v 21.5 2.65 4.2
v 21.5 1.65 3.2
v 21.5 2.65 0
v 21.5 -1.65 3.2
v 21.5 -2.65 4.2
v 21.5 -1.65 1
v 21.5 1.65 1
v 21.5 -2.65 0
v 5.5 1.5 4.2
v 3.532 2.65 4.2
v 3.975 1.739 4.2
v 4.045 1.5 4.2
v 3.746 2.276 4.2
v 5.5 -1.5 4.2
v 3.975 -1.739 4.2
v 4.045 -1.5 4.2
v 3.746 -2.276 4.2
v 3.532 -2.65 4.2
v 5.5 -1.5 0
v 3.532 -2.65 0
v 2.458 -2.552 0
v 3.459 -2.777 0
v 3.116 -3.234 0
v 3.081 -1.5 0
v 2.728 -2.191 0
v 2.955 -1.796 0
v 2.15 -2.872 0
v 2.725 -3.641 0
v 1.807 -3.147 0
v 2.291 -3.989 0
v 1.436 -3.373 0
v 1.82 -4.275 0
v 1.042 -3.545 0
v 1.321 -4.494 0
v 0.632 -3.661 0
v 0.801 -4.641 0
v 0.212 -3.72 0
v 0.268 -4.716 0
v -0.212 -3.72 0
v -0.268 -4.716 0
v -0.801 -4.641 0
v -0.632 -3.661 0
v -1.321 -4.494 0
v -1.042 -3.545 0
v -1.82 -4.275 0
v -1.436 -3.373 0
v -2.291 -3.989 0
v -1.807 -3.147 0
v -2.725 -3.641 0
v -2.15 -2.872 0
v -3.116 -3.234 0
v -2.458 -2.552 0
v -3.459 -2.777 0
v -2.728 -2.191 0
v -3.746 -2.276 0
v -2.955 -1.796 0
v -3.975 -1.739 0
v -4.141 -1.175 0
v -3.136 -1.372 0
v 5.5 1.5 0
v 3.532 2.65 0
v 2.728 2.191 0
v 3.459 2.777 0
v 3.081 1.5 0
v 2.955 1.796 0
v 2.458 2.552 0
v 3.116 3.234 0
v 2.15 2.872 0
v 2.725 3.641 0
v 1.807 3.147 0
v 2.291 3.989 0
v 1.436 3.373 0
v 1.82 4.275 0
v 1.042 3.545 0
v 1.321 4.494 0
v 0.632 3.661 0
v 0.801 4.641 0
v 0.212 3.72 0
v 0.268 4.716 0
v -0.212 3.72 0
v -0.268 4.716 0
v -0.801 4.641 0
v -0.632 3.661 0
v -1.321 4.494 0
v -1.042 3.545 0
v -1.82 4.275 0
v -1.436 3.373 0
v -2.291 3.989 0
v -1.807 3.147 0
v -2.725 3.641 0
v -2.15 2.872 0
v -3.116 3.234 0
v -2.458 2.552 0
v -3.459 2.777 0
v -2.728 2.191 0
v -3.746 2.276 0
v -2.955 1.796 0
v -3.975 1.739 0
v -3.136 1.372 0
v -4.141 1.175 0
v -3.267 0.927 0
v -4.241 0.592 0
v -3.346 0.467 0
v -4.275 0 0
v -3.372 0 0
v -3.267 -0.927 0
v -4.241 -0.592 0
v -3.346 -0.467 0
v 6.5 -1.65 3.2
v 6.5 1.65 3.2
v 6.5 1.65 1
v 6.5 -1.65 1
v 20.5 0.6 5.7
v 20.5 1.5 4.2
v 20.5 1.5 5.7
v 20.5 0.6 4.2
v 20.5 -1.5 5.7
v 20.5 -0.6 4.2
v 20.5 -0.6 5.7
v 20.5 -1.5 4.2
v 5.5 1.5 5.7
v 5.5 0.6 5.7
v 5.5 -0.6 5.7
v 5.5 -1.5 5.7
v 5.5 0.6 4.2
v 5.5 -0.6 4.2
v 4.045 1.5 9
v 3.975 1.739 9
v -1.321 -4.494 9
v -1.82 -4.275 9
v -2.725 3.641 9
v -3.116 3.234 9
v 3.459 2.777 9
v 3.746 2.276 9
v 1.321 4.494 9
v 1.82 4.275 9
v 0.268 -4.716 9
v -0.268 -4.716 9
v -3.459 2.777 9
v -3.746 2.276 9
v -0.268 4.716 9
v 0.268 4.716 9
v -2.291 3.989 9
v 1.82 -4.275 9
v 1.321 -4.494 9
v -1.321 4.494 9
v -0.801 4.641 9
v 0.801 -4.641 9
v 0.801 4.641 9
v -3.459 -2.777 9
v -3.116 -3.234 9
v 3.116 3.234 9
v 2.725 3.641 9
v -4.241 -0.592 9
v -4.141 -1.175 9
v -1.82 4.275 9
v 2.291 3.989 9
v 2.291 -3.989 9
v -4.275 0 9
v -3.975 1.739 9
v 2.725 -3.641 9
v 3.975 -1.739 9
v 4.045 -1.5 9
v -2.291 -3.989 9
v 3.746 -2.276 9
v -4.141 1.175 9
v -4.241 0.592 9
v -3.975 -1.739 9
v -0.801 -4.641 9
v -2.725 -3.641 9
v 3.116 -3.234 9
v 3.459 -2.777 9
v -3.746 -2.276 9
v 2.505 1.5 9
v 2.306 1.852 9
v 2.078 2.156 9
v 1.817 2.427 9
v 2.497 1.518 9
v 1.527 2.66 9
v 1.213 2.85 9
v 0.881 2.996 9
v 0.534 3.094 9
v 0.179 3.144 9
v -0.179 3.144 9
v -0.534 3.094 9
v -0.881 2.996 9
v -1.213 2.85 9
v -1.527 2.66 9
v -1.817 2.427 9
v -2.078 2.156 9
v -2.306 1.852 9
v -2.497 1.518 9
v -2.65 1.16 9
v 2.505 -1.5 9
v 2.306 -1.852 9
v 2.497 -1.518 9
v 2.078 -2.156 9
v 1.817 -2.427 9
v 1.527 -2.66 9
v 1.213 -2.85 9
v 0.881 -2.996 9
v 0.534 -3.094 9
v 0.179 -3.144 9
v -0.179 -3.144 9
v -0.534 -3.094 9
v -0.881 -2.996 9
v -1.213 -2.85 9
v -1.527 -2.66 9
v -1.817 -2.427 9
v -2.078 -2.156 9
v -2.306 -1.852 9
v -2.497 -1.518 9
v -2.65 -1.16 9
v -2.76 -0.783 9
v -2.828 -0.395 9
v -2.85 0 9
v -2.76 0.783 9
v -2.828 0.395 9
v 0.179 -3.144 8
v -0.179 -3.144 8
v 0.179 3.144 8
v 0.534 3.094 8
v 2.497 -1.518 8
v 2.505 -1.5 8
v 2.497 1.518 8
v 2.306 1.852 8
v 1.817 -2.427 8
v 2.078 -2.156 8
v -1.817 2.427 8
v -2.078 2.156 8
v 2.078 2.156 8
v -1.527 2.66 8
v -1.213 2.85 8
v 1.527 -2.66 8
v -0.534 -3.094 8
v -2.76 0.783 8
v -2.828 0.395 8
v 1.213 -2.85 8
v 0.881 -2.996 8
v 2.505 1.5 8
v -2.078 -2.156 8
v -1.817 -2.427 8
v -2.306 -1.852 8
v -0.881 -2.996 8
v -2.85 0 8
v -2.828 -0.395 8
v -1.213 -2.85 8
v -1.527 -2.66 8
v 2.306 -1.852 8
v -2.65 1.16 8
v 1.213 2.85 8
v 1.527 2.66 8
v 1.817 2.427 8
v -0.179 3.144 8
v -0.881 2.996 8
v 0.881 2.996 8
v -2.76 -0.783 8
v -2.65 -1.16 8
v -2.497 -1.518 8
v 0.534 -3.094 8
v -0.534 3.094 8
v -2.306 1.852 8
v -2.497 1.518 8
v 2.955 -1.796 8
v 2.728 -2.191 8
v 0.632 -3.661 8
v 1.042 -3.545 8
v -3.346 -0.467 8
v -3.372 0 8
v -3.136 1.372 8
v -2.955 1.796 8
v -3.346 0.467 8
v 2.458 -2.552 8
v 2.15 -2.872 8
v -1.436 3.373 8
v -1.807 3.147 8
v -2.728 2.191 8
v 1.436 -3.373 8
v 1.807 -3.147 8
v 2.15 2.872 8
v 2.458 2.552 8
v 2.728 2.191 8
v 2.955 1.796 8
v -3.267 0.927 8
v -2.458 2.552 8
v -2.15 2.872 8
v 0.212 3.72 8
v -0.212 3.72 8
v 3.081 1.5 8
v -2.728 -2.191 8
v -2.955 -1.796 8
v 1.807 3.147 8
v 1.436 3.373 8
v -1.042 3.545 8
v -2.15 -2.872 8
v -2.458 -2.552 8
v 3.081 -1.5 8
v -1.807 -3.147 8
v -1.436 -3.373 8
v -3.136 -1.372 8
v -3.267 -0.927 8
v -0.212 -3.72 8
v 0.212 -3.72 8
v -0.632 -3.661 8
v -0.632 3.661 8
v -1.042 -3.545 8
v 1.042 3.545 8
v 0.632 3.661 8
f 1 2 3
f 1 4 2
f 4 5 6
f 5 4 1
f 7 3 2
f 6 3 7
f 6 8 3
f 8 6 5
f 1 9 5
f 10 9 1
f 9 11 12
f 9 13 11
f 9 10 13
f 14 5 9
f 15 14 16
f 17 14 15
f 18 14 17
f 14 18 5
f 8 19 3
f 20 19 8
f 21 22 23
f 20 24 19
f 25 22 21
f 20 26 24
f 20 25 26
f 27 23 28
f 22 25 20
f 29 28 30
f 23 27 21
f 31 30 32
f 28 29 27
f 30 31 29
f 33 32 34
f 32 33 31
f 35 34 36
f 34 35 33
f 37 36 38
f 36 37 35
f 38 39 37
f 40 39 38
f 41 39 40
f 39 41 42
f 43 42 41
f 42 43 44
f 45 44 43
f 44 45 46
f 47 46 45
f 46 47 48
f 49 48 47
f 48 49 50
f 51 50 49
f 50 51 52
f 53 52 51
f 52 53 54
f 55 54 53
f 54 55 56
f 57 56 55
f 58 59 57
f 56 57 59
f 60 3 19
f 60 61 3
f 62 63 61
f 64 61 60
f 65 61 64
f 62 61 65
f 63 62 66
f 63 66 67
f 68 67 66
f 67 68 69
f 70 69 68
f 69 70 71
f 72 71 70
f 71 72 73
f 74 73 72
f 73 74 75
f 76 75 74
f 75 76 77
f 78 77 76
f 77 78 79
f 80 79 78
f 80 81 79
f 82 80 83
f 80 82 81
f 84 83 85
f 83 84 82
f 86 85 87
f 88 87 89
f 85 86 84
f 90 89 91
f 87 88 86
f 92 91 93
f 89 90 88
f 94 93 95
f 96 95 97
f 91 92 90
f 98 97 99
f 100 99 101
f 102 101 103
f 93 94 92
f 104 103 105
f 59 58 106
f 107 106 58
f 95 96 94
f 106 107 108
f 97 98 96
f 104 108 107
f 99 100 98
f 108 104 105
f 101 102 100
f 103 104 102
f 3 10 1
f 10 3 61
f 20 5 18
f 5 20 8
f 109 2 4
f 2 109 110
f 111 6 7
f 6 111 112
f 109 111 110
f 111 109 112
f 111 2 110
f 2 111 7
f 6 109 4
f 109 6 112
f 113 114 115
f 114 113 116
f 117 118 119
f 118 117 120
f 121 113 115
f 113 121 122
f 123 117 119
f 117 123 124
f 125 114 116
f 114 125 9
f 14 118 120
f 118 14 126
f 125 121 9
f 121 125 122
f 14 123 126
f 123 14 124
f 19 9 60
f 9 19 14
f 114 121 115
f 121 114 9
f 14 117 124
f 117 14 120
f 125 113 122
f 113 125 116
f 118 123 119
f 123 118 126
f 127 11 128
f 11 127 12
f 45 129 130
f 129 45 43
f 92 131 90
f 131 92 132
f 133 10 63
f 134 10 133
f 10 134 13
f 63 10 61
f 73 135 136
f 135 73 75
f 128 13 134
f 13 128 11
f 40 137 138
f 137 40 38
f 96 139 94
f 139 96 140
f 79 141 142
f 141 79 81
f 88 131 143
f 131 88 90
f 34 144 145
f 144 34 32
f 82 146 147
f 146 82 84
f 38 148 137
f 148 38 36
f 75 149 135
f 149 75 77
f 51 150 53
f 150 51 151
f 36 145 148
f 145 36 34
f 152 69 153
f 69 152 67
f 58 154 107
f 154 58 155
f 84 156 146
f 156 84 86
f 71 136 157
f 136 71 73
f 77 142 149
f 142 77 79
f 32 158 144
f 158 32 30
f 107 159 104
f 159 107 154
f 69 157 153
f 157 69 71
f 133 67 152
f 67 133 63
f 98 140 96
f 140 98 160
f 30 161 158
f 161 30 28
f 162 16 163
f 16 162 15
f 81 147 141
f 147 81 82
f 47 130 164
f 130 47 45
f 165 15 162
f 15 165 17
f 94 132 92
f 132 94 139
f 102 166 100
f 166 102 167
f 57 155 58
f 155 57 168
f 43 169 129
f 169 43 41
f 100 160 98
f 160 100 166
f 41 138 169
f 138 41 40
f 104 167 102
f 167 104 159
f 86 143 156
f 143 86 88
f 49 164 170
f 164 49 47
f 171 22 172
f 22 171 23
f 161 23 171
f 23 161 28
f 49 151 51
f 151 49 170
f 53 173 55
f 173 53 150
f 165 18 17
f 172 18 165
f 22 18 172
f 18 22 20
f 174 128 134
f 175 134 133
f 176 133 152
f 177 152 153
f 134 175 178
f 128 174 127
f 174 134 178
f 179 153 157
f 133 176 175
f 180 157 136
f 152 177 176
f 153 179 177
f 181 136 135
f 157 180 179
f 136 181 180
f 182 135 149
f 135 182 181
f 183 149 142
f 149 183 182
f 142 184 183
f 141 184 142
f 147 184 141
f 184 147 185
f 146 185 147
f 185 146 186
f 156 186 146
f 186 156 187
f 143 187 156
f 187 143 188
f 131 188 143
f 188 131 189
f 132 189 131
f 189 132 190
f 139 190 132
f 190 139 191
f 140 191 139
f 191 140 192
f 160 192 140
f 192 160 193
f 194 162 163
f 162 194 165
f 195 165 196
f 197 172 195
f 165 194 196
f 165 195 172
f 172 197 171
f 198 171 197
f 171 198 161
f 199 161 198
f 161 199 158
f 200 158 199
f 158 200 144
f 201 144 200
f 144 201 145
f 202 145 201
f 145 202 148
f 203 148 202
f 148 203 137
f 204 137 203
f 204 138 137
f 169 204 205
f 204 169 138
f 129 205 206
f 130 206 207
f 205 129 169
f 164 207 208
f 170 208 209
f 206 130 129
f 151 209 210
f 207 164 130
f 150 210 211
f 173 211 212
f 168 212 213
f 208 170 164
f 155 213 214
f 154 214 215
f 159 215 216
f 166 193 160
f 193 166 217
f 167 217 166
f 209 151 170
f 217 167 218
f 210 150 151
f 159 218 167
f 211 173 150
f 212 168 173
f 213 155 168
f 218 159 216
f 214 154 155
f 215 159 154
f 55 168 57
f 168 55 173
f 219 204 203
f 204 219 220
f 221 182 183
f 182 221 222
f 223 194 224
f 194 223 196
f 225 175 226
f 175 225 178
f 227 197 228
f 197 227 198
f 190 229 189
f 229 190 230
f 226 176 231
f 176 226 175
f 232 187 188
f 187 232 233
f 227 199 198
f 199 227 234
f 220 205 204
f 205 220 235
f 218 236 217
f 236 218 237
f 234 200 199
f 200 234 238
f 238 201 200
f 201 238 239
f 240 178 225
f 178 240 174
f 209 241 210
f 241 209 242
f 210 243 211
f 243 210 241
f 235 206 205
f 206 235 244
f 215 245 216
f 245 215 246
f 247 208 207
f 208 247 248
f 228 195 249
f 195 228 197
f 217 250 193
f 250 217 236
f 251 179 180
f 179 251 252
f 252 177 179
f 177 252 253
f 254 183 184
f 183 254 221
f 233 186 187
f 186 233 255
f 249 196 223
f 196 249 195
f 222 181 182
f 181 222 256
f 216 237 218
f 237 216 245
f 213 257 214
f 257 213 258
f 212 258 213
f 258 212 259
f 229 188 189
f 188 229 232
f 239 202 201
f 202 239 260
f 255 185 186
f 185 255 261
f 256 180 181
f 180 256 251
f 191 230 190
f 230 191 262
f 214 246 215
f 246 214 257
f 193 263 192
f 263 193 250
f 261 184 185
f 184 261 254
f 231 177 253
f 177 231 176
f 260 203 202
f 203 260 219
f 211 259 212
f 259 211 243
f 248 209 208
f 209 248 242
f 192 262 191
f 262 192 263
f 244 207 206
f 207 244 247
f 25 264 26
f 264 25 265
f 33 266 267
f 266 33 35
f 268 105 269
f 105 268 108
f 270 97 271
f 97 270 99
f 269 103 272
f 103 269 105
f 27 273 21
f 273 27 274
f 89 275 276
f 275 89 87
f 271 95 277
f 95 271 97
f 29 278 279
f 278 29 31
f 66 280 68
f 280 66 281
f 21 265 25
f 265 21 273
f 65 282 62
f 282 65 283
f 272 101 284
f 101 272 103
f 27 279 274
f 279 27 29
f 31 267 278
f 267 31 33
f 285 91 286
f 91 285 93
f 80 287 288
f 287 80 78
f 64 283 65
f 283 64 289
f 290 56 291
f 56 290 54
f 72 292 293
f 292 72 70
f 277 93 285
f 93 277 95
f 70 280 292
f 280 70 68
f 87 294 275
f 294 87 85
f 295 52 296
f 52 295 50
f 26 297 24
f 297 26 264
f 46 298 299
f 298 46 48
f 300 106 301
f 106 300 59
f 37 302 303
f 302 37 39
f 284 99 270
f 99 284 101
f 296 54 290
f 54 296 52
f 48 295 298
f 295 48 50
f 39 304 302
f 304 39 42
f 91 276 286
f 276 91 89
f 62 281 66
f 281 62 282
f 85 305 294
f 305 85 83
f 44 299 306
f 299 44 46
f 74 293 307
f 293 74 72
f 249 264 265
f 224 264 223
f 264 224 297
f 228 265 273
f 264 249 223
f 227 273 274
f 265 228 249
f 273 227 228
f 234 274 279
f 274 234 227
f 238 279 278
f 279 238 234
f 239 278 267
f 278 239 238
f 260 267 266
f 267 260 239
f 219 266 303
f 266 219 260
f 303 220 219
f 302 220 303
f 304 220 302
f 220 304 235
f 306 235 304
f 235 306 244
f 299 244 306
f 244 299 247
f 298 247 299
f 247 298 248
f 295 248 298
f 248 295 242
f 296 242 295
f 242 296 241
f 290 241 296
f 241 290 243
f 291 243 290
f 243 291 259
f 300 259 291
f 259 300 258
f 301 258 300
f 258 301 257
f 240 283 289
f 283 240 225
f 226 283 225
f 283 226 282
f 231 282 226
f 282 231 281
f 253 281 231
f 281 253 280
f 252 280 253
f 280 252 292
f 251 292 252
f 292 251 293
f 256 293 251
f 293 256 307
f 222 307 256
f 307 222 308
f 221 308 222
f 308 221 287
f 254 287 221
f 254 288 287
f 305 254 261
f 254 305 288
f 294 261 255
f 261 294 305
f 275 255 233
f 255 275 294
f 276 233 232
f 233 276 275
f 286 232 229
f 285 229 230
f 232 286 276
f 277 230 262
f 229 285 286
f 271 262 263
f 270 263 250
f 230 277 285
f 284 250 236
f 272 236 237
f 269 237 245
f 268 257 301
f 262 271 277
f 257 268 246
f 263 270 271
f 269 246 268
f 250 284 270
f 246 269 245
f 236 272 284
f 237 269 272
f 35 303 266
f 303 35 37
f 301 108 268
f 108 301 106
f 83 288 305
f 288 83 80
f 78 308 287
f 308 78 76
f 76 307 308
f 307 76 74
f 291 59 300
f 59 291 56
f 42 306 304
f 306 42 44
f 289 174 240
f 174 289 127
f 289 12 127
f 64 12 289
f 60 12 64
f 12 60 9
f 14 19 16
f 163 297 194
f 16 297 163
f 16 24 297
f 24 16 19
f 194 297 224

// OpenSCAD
outer_radius = 4.5;
inner_radius_bottom = 3.55;
inner_radius_top = 3.55;
stop_radius  = 3;

outer_height = 9;
stop_height = 1;

bend_slit_width = 1;
cable_slit_width = 3;
cable_slit_height = 12;
cable_slit_to_wingstop = 1;

stop_width = 1;

cable_guide_owidth = 3;
cable_guide_width = 1.2;
cable_guide_height = 1.5;

wing_width = 3.3;
wing_height = 2.2;
wing_wall = 1;
wing_length = 15;

$fn=50;

difference() {

	union() {
		scale([0.95, 1.05, 1]) cylinder(outer_height, outer_radius, outer_radius);
		translate([0, -(wing_width+(2*wing_wall))/2, 0]) {
			difference() {
				cube([wing_length+outer_radius+stop_width+cable_slit_to_wingstop, wing_width+(2*wing_wall), wing_height+(2*wing_wall)]);
				translate([outer_radius+stop_width+cable_slit_to_wingstop, wing_wall, wing_wall]) {
					cube([wing_length, wing_width, wing_height]);
				}
			}
		}
		//Cable guides
		translate([outer_radius+cable_slit_to_wingstop, -(cable_guide_owidth)/2, wing_height+(2*wing_wall)]) {
			difference() {
				cube([wing_length, cable_guide_owidth, cable_guide_height]);
				translate([0, (cable_guide_owidth-cable_guide_width)/2, 0]) {
					cube([wing_length, cable_guide_width, cable_guide_height]);
				}
			}
		}
	}


	scale([0.95, 1.05, 1]) cylinder(outer_height, stop_radius, stop_radius);
	scale([0.95, 1.05, 1]) cylinder(outer_height - stop_height, inner_radius_top, inner_radius_bottom);
	translate([0, -cable_slit_width/2, outer_height-cable_slit_height]) {
		cube([outer_radius+cable_slit_to_wingstop,cable_slit_width,cable_slit_height]);
	}
}
